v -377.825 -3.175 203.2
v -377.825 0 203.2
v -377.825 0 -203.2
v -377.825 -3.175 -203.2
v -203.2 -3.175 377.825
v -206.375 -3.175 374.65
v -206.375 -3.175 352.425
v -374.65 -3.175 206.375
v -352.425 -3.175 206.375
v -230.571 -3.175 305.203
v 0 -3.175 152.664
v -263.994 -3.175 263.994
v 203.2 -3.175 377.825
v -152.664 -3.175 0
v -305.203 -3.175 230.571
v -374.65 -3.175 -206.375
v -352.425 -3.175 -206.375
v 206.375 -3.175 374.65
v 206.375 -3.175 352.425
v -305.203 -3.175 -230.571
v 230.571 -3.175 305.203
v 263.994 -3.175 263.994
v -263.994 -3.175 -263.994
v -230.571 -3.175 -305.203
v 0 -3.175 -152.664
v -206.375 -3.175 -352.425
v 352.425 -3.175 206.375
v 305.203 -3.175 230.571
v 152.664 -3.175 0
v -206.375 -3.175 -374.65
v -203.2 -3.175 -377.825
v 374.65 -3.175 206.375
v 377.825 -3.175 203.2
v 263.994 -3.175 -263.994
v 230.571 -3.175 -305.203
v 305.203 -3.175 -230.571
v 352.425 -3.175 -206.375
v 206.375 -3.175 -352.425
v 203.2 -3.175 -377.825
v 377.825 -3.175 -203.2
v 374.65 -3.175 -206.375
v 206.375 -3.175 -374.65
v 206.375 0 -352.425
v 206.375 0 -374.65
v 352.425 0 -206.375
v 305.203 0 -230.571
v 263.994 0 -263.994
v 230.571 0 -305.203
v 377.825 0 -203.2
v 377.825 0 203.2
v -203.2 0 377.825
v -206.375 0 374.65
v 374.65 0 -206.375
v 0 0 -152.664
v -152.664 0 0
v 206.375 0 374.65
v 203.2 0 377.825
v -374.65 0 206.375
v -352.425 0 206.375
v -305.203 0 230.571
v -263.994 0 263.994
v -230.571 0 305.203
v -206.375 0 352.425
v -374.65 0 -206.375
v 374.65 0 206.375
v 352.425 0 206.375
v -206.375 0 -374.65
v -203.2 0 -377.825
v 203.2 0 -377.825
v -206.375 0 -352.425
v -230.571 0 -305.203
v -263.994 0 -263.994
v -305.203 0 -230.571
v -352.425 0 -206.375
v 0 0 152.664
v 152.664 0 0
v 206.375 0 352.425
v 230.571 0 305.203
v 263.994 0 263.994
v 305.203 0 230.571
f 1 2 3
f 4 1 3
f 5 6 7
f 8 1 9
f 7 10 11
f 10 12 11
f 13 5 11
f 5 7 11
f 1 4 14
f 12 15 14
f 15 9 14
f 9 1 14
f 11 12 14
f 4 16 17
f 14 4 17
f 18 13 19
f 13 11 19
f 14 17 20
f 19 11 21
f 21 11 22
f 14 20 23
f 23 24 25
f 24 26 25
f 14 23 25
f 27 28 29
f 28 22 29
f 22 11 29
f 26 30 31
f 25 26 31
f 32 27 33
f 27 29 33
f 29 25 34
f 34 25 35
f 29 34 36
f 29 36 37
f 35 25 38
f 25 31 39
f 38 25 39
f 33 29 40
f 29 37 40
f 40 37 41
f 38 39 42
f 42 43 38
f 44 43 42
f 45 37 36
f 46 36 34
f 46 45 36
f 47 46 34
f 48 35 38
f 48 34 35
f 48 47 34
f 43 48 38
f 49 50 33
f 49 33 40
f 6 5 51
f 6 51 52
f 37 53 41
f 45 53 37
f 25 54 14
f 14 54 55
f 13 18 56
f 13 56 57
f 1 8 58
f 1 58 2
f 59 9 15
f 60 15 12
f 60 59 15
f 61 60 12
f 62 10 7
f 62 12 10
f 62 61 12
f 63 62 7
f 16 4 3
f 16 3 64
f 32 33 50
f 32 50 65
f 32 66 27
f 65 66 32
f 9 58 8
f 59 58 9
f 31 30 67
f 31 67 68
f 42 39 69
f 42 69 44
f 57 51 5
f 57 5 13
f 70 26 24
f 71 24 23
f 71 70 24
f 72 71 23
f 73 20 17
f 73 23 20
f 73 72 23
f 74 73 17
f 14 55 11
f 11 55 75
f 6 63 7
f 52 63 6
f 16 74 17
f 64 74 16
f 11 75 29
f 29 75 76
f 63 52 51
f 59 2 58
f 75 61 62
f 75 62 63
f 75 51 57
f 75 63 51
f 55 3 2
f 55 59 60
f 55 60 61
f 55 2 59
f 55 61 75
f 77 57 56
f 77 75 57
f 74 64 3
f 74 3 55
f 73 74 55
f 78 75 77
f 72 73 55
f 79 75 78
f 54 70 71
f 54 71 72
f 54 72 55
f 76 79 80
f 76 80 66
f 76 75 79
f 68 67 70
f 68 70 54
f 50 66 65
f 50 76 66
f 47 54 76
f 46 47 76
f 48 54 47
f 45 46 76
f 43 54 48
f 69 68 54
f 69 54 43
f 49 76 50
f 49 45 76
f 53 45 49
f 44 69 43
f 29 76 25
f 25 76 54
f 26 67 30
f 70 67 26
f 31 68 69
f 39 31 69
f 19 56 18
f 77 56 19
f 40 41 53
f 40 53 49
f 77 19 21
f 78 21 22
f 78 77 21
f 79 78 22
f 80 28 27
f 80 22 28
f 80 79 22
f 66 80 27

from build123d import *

# Parameters (mm, degrees)
SKETCH2_W           = 755.65
SKETCH2_H           = 755.65
BASE_FLANGE1_DEPTH  = 3.175
CUT_EXTRUDE1_DEPTH  = 535.334672162
CUT_EXTRUDE2_DEPTH  = 535.334672162
BREAK_CORNER1_START = -3.175
BREAK_CORNER1_DEPTH = 3.175


# Read off the part's stored shape, not the designer's step: Break-Corner1
# Sheet-metal steps are written as plain solids
with BuildPart() as part:
    # Sketch2 → Base-Flange1 (new body)
    with BuildSketch(Plane(origin=(0, 0, 0), x_dir=(1, 0, 0), z_dir=(0, 1, 0))):
        Rectangle(SKETCH2_W, SKETCH2_H)
    extrude(amount=-BASE_FLANGE1_DEPTH)

    # Sketch3 → Cut-Extrude1 (cut, through all)
    with BuildSketch(Plane(origin=(0, 0, 0), x_dir=(1, 0, 0), z_dir=(0, 1, 0))):
        Polygon((0, -152.664354058), (152.664354058, 0), (0, 152.664354058), (-152.664354058, 0), align=None)
    extrude(amount=-CUT_EXTRUDE1_DEPTH, mode=Mode.SUBTRACT)

    # Sketch4 → Cut-Extrude2 (cut, through all)
    with BuildSketch(Plane(origin=(0, 0, 0), x_dir=(1, 0, 0), z_dir=(0, 1, 0))):
        with BuildLine():
            Line((377.825, 206.375), (352.425, 206.375))
            ThreePointArc((352.425, 206.375), (263.993664919, 263.993664919), (206.375, 352.425))
            Line((206.375, 352.425), (206.375, 377.825))
            Line((206.375, 377.825), (377.825, 377.825))
            Line((377.825, 377.825), (377.825, 206.375))
        make_face()
        with BuildLine():
            Line((206.375, -377.825), (206.375, -352.425))
            ThreePointArc((206.375, -352.425), (263.993664919, -263.993664919), (352.425, -206.375))
            Line((352.425, -206.375), (377.825, -206.375))
            Line((377.825, -206.375), (377.825, -377.825))
            Line((377.825, -377.825), (206.375, -377.825))
        make_face()
        with BuildLine():
            Line((-377.825, -206.375), (-352.425, -206.375))
            ThreePointArc((-352.425, -206.375), (-263.993664919, -263.993664919), (-206.375, -352.425))
            Line((-206.375, -352.425), (-206.375, -377.825))
            Line((-206.375, -377.825), (-377.825, -377.825))
            Line((-377.825, -377.825), (-377.825, -206.375))
        make_face()
        with BuildLine():
            Line((-206.375, 377.825), (-206.375, 352.425))
            ThreePointArc((-206.375, 352.425), (-263.993664919, 263.993664919), (-352.425, 206.375))
            Line((-352.425, 206.375), (-377.825, 206.375))
            Line((-377.825, 206.375), (-377.825, 377.825))
            Line((-377.825, 377.825), (-206.375, 377.825))
        make_face()
    extrude(amount=-CUT_EXTRUDE2_DEPTH, mode=Mode.SUBTRACT)

    # Break-Corner1 outline → Break-Corner1 (cut)
    with BuildSketch(Plane(origin=(0, 0, 0), x_dir=(1, 0, 0), z_dir=(0, 1, 0)).offset(BREAK_CORNER1_START)):
        Polygon((-206.375, 374.65), (-203.2, 377.825), (-206.375, 377.825), align=None)
        Polygon((203.2, 377.825), (206.375, 374.65), (206.375, 377.825), align=None)
        Polygon((377.825, -206.375), (377.825, -203.2), (374.65, -206.375), align=None)
        Polygon((374.65, 206.375), (377.825, 203.2), (377.825, 206.375), align=None)
        Polygon((-374.65, -206.375), (-377.825, -203.2), (-377.825, -206.375), align=None)
        Polygon((-377.825, 203.2), (-374.65, 206.375), (-377.825, 206.375), align=None)
        Polygon((206.375, -374.65), (203.2, -377.825), (206.375, -377.825), align=None)
        Polygon((-203.2, -377.825), (-206.375, -374.65), (-206.375, -377.825), align=None)
    extrude(amount=BREAK_CORNER1_DEPTH, mode=Mode.SUBTRACT)


solid = part.part
